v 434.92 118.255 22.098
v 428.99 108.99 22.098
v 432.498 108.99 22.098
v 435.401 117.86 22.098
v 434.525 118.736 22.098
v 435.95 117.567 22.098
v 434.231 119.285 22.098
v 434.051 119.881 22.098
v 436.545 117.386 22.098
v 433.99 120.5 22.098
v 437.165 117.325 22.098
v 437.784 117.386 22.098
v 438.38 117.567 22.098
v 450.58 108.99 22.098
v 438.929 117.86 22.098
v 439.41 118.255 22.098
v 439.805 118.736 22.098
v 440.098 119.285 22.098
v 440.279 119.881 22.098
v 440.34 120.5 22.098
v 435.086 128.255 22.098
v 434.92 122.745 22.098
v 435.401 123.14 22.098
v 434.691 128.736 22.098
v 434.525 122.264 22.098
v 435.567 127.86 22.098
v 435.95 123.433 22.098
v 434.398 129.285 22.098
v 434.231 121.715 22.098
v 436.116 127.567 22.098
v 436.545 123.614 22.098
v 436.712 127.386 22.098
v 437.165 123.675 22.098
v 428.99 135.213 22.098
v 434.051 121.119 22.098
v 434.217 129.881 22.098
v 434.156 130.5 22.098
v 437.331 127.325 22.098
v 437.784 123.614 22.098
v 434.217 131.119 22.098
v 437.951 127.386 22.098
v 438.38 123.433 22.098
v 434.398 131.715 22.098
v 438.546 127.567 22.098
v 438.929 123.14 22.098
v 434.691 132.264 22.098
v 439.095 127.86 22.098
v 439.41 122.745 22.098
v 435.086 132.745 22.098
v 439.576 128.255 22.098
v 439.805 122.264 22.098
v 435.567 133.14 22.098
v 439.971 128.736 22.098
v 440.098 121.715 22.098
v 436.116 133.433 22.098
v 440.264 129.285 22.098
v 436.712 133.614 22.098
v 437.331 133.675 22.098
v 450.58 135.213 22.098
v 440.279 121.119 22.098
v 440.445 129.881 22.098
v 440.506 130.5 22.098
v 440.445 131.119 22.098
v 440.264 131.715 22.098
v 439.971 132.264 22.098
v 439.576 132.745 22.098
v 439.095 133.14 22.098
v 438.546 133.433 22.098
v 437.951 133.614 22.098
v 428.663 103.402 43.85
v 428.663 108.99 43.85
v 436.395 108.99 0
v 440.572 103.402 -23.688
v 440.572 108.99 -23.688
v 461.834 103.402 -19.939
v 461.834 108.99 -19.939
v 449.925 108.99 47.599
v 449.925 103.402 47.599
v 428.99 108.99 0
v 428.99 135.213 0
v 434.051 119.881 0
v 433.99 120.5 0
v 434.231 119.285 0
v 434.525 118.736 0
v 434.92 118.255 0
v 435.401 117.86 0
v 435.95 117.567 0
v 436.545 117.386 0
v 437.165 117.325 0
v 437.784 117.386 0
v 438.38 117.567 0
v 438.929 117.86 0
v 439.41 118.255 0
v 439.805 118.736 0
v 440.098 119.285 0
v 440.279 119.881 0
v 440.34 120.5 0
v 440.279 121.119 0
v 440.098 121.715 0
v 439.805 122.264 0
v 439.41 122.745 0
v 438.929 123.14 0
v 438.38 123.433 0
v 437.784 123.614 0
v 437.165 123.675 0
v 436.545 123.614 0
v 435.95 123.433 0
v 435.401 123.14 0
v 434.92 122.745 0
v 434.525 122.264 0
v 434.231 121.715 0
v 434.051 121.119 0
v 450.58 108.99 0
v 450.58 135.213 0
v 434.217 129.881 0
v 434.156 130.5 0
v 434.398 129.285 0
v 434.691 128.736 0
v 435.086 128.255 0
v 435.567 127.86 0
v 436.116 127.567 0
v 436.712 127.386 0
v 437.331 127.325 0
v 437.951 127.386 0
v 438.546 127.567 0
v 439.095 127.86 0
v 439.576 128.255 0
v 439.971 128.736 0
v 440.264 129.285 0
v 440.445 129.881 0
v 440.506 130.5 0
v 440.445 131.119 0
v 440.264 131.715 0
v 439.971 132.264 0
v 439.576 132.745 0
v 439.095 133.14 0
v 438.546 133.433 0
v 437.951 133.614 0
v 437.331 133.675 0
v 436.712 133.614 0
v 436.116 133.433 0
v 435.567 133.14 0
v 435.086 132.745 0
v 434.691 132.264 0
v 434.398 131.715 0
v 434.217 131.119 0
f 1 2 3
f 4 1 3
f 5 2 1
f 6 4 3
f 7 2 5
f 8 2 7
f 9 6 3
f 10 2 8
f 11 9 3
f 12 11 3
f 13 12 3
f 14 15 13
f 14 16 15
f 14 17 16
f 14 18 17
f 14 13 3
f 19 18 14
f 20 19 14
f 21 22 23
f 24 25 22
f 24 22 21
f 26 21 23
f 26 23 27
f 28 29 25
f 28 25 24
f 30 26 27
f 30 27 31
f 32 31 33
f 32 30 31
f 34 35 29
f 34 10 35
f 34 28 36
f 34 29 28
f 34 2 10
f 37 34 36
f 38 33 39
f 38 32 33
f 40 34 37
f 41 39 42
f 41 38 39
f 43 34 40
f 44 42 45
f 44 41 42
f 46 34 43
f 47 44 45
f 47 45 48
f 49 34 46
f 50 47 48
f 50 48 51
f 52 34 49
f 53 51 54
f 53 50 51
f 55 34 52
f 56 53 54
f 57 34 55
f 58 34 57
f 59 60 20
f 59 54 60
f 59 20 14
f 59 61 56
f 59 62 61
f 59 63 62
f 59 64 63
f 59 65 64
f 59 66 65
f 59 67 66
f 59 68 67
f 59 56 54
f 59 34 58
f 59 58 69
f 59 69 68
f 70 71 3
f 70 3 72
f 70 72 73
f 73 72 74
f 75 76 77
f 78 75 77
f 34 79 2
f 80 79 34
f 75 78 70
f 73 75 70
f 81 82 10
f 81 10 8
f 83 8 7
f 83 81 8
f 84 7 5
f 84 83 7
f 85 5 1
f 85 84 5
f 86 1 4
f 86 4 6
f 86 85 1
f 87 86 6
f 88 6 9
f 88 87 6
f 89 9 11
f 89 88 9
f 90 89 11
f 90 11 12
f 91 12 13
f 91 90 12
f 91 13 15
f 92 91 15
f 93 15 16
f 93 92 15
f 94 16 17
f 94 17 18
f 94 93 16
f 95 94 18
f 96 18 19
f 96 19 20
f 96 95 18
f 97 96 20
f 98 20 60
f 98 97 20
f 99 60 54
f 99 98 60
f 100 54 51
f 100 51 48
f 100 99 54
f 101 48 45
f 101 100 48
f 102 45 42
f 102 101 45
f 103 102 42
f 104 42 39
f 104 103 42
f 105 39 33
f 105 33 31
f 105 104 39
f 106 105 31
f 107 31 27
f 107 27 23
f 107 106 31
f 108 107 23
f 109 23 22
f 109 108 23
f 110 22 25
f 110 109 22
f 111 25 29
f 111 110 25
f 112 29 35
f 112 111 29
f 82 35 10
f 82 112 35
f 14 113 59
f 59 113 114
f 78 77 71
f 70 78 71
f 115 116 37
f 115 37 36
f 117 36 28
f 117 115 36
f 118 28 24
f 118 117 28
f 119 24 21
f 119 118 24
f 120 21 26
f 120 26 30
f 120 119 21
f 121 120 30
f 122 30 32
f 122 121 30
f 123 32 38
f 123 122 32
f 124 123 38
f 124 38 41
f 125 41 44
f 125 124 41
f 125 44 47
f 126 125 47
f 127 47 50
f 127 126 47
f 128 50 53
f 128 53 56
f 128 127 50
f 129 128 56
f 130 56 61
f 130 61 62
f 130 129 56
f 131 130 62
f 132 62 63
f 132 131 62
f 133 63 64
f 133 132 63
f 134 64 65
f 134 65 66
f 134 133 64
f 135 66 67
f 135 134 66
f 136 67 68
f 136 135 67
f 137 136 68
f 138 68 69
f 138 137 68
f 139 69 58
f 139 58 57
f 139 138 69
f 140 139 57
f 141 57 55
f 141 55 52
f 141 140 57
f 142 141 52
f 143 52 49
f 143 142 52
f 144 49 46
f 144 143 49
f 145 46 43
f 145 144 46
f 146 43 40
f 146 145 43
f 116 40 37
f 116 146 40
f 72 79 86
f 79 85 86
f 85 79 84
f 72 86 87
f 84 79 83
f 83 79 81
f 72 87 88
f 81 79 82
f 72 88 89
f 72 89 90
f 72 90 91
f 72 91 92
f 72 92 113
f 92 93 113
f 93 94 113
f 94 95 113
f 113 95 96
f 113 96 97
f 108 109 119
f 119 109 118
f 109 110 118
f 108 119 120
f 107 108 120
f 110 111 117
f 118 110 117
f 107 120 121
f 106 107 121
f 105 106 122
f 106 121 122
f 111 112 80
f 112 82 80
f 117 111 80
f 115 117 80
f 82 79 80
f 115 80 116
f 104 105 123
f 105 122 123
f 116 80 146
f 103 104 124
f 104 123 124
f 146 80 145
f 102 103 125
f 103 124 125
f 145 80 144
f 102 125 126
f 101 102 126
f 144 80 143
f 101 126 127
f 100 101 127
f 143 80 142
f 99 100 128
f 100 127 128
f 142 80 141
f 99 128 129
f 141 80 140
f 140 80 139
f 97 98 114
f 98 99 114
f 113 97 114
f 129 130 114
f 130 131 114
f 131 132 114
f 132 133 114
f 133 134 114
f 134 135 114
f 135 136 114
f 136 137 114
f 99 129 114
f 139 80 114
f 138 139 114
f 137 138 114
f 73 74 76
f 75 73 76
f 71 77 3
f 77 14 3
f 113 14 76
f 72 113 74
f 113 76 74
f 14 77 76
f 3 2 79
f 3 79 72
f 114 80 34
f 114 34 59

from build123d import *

# Parameters (mm, degrees)
SKETCH1_W           = 21.59
SKETCH1_H           = 26.222681286
SKETCH1_R           = 3.175
BOSS_EXTRUDE1_DEPTH = 22.098
BOSS_EXTRUDE2_DEPTH = 5.588


with BuildPart() as part:
    # Sketch1 → Boss-Extrude1 (new body)
    with BuildSketch(Plane.XY):
        with Locations((439.785229177, 122.101713944)):
            Rectangle(SKETCH1_W, SKETCH1_H)
        with Locations(Location((437.331098026, 130.5, 0), (0, 0, 180))):
            Circle(SKETCH1_R, mode=Mode.SUBTRACT)
        with Locations(Location((437.164813366, 120.5, 0), (0, 0, 180))):
            Circle(SKETCH1_R, mode=Mode.SUBTRACT)
    extrude(amount=BOSS_EXTRUDE1_DEPTH)

    # Sketch2 → Boss-Extrude2 (add)
    with BuildSketch(Plane(origin=(0, 108.990373301, 0), x_dir=(1, 0, 0), z_dir=(0, 1, 0))):
        Polygon((428.662736998, -43.850251272), (440.571529023, 23.68786443), (461.83352841, 19.938800274), (449.924736386, -47.599315428), align=None)
    extrude(amount=-BOSS_EXTRUDE2_DEPTH)


solid = part.part
